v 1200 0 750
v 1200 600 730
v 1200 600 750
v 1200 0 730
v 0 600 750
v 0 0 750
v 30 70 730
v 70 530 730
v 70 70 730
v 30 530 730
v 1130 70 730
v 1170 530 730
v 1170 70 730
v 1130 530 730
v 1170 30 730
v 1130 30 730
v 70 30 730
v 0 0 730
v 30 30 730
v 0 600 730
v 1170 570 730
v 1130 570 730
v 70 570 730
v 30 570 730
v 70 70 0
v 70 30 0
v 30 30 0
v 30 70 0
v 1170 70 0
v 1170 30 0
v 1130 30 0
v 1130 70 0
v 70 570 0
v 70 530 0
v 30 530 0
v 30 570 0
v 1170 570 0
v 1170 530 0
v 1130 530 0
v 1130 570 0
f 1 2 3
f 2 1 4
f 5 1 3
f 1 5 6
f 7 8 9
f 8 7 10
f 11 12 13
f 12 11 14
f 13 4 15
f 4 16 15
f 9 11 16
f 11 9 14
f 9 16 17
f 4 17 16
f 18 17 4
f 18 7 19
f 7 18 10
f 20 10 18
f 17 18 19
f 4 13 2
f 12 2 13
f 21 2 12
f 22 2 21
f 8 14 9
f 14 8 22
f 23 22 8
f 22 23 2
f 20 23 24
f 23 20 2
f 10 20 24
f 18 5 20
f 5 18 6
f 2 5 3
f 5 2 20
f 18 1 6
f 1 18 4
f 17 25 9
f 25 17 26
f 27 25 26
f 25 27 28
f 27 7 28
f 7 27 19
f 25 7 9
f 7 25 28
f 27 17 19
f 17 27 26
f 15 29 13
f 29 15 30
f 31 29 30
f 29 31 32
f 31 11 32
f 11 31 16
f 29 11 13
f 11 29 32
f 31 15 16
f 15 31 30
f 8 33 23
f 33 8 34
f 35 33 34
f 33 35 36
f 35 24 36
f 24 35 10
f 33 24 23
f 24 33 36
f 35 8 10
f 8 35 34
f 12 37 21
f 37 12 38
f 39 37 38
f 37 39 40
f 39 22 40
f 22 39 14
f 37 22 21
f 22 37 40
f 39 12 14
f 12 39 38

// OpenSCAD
// Parameters (mm)
table_length = 1200;
table_width = 600;
table_height = 750;
top_thickness = 20;
leg_size = 40;
leg_inset = 30;

// Derived values
leg_height = table_height - top_thickness;

// Main assembly
union() {
    // Tabletop positioned so top surface is at Z = table_height
    translate([0, 0, table_height - top_thickness])
        cube([table_length, table_width, top_thickness]);
    
    // Four legs positioned inset from tabletop edges
    // Front-left leg
    translate([leg_inset, leg_inset, 0])
        cube([leg_size, leg_size, leg_height]);
    
    // Front-right leg
    translate([table_length - leg_inset - leg_size, leg_inset, 0])
        cube([leg_size, leg_size, leg_height]);
    
    // Back-left leg
    translate([leg_inset, table_width - leg_inset - leg_size, 0])
        cube([leg_size, leg_size, leg_height]);
    
    // Back-right leg
    translate([table_length - leg_inset - leg_size, table_width - leg_inset - leg_size, 0])
        cube([leg_size, leg_size, leg_height]);
}
